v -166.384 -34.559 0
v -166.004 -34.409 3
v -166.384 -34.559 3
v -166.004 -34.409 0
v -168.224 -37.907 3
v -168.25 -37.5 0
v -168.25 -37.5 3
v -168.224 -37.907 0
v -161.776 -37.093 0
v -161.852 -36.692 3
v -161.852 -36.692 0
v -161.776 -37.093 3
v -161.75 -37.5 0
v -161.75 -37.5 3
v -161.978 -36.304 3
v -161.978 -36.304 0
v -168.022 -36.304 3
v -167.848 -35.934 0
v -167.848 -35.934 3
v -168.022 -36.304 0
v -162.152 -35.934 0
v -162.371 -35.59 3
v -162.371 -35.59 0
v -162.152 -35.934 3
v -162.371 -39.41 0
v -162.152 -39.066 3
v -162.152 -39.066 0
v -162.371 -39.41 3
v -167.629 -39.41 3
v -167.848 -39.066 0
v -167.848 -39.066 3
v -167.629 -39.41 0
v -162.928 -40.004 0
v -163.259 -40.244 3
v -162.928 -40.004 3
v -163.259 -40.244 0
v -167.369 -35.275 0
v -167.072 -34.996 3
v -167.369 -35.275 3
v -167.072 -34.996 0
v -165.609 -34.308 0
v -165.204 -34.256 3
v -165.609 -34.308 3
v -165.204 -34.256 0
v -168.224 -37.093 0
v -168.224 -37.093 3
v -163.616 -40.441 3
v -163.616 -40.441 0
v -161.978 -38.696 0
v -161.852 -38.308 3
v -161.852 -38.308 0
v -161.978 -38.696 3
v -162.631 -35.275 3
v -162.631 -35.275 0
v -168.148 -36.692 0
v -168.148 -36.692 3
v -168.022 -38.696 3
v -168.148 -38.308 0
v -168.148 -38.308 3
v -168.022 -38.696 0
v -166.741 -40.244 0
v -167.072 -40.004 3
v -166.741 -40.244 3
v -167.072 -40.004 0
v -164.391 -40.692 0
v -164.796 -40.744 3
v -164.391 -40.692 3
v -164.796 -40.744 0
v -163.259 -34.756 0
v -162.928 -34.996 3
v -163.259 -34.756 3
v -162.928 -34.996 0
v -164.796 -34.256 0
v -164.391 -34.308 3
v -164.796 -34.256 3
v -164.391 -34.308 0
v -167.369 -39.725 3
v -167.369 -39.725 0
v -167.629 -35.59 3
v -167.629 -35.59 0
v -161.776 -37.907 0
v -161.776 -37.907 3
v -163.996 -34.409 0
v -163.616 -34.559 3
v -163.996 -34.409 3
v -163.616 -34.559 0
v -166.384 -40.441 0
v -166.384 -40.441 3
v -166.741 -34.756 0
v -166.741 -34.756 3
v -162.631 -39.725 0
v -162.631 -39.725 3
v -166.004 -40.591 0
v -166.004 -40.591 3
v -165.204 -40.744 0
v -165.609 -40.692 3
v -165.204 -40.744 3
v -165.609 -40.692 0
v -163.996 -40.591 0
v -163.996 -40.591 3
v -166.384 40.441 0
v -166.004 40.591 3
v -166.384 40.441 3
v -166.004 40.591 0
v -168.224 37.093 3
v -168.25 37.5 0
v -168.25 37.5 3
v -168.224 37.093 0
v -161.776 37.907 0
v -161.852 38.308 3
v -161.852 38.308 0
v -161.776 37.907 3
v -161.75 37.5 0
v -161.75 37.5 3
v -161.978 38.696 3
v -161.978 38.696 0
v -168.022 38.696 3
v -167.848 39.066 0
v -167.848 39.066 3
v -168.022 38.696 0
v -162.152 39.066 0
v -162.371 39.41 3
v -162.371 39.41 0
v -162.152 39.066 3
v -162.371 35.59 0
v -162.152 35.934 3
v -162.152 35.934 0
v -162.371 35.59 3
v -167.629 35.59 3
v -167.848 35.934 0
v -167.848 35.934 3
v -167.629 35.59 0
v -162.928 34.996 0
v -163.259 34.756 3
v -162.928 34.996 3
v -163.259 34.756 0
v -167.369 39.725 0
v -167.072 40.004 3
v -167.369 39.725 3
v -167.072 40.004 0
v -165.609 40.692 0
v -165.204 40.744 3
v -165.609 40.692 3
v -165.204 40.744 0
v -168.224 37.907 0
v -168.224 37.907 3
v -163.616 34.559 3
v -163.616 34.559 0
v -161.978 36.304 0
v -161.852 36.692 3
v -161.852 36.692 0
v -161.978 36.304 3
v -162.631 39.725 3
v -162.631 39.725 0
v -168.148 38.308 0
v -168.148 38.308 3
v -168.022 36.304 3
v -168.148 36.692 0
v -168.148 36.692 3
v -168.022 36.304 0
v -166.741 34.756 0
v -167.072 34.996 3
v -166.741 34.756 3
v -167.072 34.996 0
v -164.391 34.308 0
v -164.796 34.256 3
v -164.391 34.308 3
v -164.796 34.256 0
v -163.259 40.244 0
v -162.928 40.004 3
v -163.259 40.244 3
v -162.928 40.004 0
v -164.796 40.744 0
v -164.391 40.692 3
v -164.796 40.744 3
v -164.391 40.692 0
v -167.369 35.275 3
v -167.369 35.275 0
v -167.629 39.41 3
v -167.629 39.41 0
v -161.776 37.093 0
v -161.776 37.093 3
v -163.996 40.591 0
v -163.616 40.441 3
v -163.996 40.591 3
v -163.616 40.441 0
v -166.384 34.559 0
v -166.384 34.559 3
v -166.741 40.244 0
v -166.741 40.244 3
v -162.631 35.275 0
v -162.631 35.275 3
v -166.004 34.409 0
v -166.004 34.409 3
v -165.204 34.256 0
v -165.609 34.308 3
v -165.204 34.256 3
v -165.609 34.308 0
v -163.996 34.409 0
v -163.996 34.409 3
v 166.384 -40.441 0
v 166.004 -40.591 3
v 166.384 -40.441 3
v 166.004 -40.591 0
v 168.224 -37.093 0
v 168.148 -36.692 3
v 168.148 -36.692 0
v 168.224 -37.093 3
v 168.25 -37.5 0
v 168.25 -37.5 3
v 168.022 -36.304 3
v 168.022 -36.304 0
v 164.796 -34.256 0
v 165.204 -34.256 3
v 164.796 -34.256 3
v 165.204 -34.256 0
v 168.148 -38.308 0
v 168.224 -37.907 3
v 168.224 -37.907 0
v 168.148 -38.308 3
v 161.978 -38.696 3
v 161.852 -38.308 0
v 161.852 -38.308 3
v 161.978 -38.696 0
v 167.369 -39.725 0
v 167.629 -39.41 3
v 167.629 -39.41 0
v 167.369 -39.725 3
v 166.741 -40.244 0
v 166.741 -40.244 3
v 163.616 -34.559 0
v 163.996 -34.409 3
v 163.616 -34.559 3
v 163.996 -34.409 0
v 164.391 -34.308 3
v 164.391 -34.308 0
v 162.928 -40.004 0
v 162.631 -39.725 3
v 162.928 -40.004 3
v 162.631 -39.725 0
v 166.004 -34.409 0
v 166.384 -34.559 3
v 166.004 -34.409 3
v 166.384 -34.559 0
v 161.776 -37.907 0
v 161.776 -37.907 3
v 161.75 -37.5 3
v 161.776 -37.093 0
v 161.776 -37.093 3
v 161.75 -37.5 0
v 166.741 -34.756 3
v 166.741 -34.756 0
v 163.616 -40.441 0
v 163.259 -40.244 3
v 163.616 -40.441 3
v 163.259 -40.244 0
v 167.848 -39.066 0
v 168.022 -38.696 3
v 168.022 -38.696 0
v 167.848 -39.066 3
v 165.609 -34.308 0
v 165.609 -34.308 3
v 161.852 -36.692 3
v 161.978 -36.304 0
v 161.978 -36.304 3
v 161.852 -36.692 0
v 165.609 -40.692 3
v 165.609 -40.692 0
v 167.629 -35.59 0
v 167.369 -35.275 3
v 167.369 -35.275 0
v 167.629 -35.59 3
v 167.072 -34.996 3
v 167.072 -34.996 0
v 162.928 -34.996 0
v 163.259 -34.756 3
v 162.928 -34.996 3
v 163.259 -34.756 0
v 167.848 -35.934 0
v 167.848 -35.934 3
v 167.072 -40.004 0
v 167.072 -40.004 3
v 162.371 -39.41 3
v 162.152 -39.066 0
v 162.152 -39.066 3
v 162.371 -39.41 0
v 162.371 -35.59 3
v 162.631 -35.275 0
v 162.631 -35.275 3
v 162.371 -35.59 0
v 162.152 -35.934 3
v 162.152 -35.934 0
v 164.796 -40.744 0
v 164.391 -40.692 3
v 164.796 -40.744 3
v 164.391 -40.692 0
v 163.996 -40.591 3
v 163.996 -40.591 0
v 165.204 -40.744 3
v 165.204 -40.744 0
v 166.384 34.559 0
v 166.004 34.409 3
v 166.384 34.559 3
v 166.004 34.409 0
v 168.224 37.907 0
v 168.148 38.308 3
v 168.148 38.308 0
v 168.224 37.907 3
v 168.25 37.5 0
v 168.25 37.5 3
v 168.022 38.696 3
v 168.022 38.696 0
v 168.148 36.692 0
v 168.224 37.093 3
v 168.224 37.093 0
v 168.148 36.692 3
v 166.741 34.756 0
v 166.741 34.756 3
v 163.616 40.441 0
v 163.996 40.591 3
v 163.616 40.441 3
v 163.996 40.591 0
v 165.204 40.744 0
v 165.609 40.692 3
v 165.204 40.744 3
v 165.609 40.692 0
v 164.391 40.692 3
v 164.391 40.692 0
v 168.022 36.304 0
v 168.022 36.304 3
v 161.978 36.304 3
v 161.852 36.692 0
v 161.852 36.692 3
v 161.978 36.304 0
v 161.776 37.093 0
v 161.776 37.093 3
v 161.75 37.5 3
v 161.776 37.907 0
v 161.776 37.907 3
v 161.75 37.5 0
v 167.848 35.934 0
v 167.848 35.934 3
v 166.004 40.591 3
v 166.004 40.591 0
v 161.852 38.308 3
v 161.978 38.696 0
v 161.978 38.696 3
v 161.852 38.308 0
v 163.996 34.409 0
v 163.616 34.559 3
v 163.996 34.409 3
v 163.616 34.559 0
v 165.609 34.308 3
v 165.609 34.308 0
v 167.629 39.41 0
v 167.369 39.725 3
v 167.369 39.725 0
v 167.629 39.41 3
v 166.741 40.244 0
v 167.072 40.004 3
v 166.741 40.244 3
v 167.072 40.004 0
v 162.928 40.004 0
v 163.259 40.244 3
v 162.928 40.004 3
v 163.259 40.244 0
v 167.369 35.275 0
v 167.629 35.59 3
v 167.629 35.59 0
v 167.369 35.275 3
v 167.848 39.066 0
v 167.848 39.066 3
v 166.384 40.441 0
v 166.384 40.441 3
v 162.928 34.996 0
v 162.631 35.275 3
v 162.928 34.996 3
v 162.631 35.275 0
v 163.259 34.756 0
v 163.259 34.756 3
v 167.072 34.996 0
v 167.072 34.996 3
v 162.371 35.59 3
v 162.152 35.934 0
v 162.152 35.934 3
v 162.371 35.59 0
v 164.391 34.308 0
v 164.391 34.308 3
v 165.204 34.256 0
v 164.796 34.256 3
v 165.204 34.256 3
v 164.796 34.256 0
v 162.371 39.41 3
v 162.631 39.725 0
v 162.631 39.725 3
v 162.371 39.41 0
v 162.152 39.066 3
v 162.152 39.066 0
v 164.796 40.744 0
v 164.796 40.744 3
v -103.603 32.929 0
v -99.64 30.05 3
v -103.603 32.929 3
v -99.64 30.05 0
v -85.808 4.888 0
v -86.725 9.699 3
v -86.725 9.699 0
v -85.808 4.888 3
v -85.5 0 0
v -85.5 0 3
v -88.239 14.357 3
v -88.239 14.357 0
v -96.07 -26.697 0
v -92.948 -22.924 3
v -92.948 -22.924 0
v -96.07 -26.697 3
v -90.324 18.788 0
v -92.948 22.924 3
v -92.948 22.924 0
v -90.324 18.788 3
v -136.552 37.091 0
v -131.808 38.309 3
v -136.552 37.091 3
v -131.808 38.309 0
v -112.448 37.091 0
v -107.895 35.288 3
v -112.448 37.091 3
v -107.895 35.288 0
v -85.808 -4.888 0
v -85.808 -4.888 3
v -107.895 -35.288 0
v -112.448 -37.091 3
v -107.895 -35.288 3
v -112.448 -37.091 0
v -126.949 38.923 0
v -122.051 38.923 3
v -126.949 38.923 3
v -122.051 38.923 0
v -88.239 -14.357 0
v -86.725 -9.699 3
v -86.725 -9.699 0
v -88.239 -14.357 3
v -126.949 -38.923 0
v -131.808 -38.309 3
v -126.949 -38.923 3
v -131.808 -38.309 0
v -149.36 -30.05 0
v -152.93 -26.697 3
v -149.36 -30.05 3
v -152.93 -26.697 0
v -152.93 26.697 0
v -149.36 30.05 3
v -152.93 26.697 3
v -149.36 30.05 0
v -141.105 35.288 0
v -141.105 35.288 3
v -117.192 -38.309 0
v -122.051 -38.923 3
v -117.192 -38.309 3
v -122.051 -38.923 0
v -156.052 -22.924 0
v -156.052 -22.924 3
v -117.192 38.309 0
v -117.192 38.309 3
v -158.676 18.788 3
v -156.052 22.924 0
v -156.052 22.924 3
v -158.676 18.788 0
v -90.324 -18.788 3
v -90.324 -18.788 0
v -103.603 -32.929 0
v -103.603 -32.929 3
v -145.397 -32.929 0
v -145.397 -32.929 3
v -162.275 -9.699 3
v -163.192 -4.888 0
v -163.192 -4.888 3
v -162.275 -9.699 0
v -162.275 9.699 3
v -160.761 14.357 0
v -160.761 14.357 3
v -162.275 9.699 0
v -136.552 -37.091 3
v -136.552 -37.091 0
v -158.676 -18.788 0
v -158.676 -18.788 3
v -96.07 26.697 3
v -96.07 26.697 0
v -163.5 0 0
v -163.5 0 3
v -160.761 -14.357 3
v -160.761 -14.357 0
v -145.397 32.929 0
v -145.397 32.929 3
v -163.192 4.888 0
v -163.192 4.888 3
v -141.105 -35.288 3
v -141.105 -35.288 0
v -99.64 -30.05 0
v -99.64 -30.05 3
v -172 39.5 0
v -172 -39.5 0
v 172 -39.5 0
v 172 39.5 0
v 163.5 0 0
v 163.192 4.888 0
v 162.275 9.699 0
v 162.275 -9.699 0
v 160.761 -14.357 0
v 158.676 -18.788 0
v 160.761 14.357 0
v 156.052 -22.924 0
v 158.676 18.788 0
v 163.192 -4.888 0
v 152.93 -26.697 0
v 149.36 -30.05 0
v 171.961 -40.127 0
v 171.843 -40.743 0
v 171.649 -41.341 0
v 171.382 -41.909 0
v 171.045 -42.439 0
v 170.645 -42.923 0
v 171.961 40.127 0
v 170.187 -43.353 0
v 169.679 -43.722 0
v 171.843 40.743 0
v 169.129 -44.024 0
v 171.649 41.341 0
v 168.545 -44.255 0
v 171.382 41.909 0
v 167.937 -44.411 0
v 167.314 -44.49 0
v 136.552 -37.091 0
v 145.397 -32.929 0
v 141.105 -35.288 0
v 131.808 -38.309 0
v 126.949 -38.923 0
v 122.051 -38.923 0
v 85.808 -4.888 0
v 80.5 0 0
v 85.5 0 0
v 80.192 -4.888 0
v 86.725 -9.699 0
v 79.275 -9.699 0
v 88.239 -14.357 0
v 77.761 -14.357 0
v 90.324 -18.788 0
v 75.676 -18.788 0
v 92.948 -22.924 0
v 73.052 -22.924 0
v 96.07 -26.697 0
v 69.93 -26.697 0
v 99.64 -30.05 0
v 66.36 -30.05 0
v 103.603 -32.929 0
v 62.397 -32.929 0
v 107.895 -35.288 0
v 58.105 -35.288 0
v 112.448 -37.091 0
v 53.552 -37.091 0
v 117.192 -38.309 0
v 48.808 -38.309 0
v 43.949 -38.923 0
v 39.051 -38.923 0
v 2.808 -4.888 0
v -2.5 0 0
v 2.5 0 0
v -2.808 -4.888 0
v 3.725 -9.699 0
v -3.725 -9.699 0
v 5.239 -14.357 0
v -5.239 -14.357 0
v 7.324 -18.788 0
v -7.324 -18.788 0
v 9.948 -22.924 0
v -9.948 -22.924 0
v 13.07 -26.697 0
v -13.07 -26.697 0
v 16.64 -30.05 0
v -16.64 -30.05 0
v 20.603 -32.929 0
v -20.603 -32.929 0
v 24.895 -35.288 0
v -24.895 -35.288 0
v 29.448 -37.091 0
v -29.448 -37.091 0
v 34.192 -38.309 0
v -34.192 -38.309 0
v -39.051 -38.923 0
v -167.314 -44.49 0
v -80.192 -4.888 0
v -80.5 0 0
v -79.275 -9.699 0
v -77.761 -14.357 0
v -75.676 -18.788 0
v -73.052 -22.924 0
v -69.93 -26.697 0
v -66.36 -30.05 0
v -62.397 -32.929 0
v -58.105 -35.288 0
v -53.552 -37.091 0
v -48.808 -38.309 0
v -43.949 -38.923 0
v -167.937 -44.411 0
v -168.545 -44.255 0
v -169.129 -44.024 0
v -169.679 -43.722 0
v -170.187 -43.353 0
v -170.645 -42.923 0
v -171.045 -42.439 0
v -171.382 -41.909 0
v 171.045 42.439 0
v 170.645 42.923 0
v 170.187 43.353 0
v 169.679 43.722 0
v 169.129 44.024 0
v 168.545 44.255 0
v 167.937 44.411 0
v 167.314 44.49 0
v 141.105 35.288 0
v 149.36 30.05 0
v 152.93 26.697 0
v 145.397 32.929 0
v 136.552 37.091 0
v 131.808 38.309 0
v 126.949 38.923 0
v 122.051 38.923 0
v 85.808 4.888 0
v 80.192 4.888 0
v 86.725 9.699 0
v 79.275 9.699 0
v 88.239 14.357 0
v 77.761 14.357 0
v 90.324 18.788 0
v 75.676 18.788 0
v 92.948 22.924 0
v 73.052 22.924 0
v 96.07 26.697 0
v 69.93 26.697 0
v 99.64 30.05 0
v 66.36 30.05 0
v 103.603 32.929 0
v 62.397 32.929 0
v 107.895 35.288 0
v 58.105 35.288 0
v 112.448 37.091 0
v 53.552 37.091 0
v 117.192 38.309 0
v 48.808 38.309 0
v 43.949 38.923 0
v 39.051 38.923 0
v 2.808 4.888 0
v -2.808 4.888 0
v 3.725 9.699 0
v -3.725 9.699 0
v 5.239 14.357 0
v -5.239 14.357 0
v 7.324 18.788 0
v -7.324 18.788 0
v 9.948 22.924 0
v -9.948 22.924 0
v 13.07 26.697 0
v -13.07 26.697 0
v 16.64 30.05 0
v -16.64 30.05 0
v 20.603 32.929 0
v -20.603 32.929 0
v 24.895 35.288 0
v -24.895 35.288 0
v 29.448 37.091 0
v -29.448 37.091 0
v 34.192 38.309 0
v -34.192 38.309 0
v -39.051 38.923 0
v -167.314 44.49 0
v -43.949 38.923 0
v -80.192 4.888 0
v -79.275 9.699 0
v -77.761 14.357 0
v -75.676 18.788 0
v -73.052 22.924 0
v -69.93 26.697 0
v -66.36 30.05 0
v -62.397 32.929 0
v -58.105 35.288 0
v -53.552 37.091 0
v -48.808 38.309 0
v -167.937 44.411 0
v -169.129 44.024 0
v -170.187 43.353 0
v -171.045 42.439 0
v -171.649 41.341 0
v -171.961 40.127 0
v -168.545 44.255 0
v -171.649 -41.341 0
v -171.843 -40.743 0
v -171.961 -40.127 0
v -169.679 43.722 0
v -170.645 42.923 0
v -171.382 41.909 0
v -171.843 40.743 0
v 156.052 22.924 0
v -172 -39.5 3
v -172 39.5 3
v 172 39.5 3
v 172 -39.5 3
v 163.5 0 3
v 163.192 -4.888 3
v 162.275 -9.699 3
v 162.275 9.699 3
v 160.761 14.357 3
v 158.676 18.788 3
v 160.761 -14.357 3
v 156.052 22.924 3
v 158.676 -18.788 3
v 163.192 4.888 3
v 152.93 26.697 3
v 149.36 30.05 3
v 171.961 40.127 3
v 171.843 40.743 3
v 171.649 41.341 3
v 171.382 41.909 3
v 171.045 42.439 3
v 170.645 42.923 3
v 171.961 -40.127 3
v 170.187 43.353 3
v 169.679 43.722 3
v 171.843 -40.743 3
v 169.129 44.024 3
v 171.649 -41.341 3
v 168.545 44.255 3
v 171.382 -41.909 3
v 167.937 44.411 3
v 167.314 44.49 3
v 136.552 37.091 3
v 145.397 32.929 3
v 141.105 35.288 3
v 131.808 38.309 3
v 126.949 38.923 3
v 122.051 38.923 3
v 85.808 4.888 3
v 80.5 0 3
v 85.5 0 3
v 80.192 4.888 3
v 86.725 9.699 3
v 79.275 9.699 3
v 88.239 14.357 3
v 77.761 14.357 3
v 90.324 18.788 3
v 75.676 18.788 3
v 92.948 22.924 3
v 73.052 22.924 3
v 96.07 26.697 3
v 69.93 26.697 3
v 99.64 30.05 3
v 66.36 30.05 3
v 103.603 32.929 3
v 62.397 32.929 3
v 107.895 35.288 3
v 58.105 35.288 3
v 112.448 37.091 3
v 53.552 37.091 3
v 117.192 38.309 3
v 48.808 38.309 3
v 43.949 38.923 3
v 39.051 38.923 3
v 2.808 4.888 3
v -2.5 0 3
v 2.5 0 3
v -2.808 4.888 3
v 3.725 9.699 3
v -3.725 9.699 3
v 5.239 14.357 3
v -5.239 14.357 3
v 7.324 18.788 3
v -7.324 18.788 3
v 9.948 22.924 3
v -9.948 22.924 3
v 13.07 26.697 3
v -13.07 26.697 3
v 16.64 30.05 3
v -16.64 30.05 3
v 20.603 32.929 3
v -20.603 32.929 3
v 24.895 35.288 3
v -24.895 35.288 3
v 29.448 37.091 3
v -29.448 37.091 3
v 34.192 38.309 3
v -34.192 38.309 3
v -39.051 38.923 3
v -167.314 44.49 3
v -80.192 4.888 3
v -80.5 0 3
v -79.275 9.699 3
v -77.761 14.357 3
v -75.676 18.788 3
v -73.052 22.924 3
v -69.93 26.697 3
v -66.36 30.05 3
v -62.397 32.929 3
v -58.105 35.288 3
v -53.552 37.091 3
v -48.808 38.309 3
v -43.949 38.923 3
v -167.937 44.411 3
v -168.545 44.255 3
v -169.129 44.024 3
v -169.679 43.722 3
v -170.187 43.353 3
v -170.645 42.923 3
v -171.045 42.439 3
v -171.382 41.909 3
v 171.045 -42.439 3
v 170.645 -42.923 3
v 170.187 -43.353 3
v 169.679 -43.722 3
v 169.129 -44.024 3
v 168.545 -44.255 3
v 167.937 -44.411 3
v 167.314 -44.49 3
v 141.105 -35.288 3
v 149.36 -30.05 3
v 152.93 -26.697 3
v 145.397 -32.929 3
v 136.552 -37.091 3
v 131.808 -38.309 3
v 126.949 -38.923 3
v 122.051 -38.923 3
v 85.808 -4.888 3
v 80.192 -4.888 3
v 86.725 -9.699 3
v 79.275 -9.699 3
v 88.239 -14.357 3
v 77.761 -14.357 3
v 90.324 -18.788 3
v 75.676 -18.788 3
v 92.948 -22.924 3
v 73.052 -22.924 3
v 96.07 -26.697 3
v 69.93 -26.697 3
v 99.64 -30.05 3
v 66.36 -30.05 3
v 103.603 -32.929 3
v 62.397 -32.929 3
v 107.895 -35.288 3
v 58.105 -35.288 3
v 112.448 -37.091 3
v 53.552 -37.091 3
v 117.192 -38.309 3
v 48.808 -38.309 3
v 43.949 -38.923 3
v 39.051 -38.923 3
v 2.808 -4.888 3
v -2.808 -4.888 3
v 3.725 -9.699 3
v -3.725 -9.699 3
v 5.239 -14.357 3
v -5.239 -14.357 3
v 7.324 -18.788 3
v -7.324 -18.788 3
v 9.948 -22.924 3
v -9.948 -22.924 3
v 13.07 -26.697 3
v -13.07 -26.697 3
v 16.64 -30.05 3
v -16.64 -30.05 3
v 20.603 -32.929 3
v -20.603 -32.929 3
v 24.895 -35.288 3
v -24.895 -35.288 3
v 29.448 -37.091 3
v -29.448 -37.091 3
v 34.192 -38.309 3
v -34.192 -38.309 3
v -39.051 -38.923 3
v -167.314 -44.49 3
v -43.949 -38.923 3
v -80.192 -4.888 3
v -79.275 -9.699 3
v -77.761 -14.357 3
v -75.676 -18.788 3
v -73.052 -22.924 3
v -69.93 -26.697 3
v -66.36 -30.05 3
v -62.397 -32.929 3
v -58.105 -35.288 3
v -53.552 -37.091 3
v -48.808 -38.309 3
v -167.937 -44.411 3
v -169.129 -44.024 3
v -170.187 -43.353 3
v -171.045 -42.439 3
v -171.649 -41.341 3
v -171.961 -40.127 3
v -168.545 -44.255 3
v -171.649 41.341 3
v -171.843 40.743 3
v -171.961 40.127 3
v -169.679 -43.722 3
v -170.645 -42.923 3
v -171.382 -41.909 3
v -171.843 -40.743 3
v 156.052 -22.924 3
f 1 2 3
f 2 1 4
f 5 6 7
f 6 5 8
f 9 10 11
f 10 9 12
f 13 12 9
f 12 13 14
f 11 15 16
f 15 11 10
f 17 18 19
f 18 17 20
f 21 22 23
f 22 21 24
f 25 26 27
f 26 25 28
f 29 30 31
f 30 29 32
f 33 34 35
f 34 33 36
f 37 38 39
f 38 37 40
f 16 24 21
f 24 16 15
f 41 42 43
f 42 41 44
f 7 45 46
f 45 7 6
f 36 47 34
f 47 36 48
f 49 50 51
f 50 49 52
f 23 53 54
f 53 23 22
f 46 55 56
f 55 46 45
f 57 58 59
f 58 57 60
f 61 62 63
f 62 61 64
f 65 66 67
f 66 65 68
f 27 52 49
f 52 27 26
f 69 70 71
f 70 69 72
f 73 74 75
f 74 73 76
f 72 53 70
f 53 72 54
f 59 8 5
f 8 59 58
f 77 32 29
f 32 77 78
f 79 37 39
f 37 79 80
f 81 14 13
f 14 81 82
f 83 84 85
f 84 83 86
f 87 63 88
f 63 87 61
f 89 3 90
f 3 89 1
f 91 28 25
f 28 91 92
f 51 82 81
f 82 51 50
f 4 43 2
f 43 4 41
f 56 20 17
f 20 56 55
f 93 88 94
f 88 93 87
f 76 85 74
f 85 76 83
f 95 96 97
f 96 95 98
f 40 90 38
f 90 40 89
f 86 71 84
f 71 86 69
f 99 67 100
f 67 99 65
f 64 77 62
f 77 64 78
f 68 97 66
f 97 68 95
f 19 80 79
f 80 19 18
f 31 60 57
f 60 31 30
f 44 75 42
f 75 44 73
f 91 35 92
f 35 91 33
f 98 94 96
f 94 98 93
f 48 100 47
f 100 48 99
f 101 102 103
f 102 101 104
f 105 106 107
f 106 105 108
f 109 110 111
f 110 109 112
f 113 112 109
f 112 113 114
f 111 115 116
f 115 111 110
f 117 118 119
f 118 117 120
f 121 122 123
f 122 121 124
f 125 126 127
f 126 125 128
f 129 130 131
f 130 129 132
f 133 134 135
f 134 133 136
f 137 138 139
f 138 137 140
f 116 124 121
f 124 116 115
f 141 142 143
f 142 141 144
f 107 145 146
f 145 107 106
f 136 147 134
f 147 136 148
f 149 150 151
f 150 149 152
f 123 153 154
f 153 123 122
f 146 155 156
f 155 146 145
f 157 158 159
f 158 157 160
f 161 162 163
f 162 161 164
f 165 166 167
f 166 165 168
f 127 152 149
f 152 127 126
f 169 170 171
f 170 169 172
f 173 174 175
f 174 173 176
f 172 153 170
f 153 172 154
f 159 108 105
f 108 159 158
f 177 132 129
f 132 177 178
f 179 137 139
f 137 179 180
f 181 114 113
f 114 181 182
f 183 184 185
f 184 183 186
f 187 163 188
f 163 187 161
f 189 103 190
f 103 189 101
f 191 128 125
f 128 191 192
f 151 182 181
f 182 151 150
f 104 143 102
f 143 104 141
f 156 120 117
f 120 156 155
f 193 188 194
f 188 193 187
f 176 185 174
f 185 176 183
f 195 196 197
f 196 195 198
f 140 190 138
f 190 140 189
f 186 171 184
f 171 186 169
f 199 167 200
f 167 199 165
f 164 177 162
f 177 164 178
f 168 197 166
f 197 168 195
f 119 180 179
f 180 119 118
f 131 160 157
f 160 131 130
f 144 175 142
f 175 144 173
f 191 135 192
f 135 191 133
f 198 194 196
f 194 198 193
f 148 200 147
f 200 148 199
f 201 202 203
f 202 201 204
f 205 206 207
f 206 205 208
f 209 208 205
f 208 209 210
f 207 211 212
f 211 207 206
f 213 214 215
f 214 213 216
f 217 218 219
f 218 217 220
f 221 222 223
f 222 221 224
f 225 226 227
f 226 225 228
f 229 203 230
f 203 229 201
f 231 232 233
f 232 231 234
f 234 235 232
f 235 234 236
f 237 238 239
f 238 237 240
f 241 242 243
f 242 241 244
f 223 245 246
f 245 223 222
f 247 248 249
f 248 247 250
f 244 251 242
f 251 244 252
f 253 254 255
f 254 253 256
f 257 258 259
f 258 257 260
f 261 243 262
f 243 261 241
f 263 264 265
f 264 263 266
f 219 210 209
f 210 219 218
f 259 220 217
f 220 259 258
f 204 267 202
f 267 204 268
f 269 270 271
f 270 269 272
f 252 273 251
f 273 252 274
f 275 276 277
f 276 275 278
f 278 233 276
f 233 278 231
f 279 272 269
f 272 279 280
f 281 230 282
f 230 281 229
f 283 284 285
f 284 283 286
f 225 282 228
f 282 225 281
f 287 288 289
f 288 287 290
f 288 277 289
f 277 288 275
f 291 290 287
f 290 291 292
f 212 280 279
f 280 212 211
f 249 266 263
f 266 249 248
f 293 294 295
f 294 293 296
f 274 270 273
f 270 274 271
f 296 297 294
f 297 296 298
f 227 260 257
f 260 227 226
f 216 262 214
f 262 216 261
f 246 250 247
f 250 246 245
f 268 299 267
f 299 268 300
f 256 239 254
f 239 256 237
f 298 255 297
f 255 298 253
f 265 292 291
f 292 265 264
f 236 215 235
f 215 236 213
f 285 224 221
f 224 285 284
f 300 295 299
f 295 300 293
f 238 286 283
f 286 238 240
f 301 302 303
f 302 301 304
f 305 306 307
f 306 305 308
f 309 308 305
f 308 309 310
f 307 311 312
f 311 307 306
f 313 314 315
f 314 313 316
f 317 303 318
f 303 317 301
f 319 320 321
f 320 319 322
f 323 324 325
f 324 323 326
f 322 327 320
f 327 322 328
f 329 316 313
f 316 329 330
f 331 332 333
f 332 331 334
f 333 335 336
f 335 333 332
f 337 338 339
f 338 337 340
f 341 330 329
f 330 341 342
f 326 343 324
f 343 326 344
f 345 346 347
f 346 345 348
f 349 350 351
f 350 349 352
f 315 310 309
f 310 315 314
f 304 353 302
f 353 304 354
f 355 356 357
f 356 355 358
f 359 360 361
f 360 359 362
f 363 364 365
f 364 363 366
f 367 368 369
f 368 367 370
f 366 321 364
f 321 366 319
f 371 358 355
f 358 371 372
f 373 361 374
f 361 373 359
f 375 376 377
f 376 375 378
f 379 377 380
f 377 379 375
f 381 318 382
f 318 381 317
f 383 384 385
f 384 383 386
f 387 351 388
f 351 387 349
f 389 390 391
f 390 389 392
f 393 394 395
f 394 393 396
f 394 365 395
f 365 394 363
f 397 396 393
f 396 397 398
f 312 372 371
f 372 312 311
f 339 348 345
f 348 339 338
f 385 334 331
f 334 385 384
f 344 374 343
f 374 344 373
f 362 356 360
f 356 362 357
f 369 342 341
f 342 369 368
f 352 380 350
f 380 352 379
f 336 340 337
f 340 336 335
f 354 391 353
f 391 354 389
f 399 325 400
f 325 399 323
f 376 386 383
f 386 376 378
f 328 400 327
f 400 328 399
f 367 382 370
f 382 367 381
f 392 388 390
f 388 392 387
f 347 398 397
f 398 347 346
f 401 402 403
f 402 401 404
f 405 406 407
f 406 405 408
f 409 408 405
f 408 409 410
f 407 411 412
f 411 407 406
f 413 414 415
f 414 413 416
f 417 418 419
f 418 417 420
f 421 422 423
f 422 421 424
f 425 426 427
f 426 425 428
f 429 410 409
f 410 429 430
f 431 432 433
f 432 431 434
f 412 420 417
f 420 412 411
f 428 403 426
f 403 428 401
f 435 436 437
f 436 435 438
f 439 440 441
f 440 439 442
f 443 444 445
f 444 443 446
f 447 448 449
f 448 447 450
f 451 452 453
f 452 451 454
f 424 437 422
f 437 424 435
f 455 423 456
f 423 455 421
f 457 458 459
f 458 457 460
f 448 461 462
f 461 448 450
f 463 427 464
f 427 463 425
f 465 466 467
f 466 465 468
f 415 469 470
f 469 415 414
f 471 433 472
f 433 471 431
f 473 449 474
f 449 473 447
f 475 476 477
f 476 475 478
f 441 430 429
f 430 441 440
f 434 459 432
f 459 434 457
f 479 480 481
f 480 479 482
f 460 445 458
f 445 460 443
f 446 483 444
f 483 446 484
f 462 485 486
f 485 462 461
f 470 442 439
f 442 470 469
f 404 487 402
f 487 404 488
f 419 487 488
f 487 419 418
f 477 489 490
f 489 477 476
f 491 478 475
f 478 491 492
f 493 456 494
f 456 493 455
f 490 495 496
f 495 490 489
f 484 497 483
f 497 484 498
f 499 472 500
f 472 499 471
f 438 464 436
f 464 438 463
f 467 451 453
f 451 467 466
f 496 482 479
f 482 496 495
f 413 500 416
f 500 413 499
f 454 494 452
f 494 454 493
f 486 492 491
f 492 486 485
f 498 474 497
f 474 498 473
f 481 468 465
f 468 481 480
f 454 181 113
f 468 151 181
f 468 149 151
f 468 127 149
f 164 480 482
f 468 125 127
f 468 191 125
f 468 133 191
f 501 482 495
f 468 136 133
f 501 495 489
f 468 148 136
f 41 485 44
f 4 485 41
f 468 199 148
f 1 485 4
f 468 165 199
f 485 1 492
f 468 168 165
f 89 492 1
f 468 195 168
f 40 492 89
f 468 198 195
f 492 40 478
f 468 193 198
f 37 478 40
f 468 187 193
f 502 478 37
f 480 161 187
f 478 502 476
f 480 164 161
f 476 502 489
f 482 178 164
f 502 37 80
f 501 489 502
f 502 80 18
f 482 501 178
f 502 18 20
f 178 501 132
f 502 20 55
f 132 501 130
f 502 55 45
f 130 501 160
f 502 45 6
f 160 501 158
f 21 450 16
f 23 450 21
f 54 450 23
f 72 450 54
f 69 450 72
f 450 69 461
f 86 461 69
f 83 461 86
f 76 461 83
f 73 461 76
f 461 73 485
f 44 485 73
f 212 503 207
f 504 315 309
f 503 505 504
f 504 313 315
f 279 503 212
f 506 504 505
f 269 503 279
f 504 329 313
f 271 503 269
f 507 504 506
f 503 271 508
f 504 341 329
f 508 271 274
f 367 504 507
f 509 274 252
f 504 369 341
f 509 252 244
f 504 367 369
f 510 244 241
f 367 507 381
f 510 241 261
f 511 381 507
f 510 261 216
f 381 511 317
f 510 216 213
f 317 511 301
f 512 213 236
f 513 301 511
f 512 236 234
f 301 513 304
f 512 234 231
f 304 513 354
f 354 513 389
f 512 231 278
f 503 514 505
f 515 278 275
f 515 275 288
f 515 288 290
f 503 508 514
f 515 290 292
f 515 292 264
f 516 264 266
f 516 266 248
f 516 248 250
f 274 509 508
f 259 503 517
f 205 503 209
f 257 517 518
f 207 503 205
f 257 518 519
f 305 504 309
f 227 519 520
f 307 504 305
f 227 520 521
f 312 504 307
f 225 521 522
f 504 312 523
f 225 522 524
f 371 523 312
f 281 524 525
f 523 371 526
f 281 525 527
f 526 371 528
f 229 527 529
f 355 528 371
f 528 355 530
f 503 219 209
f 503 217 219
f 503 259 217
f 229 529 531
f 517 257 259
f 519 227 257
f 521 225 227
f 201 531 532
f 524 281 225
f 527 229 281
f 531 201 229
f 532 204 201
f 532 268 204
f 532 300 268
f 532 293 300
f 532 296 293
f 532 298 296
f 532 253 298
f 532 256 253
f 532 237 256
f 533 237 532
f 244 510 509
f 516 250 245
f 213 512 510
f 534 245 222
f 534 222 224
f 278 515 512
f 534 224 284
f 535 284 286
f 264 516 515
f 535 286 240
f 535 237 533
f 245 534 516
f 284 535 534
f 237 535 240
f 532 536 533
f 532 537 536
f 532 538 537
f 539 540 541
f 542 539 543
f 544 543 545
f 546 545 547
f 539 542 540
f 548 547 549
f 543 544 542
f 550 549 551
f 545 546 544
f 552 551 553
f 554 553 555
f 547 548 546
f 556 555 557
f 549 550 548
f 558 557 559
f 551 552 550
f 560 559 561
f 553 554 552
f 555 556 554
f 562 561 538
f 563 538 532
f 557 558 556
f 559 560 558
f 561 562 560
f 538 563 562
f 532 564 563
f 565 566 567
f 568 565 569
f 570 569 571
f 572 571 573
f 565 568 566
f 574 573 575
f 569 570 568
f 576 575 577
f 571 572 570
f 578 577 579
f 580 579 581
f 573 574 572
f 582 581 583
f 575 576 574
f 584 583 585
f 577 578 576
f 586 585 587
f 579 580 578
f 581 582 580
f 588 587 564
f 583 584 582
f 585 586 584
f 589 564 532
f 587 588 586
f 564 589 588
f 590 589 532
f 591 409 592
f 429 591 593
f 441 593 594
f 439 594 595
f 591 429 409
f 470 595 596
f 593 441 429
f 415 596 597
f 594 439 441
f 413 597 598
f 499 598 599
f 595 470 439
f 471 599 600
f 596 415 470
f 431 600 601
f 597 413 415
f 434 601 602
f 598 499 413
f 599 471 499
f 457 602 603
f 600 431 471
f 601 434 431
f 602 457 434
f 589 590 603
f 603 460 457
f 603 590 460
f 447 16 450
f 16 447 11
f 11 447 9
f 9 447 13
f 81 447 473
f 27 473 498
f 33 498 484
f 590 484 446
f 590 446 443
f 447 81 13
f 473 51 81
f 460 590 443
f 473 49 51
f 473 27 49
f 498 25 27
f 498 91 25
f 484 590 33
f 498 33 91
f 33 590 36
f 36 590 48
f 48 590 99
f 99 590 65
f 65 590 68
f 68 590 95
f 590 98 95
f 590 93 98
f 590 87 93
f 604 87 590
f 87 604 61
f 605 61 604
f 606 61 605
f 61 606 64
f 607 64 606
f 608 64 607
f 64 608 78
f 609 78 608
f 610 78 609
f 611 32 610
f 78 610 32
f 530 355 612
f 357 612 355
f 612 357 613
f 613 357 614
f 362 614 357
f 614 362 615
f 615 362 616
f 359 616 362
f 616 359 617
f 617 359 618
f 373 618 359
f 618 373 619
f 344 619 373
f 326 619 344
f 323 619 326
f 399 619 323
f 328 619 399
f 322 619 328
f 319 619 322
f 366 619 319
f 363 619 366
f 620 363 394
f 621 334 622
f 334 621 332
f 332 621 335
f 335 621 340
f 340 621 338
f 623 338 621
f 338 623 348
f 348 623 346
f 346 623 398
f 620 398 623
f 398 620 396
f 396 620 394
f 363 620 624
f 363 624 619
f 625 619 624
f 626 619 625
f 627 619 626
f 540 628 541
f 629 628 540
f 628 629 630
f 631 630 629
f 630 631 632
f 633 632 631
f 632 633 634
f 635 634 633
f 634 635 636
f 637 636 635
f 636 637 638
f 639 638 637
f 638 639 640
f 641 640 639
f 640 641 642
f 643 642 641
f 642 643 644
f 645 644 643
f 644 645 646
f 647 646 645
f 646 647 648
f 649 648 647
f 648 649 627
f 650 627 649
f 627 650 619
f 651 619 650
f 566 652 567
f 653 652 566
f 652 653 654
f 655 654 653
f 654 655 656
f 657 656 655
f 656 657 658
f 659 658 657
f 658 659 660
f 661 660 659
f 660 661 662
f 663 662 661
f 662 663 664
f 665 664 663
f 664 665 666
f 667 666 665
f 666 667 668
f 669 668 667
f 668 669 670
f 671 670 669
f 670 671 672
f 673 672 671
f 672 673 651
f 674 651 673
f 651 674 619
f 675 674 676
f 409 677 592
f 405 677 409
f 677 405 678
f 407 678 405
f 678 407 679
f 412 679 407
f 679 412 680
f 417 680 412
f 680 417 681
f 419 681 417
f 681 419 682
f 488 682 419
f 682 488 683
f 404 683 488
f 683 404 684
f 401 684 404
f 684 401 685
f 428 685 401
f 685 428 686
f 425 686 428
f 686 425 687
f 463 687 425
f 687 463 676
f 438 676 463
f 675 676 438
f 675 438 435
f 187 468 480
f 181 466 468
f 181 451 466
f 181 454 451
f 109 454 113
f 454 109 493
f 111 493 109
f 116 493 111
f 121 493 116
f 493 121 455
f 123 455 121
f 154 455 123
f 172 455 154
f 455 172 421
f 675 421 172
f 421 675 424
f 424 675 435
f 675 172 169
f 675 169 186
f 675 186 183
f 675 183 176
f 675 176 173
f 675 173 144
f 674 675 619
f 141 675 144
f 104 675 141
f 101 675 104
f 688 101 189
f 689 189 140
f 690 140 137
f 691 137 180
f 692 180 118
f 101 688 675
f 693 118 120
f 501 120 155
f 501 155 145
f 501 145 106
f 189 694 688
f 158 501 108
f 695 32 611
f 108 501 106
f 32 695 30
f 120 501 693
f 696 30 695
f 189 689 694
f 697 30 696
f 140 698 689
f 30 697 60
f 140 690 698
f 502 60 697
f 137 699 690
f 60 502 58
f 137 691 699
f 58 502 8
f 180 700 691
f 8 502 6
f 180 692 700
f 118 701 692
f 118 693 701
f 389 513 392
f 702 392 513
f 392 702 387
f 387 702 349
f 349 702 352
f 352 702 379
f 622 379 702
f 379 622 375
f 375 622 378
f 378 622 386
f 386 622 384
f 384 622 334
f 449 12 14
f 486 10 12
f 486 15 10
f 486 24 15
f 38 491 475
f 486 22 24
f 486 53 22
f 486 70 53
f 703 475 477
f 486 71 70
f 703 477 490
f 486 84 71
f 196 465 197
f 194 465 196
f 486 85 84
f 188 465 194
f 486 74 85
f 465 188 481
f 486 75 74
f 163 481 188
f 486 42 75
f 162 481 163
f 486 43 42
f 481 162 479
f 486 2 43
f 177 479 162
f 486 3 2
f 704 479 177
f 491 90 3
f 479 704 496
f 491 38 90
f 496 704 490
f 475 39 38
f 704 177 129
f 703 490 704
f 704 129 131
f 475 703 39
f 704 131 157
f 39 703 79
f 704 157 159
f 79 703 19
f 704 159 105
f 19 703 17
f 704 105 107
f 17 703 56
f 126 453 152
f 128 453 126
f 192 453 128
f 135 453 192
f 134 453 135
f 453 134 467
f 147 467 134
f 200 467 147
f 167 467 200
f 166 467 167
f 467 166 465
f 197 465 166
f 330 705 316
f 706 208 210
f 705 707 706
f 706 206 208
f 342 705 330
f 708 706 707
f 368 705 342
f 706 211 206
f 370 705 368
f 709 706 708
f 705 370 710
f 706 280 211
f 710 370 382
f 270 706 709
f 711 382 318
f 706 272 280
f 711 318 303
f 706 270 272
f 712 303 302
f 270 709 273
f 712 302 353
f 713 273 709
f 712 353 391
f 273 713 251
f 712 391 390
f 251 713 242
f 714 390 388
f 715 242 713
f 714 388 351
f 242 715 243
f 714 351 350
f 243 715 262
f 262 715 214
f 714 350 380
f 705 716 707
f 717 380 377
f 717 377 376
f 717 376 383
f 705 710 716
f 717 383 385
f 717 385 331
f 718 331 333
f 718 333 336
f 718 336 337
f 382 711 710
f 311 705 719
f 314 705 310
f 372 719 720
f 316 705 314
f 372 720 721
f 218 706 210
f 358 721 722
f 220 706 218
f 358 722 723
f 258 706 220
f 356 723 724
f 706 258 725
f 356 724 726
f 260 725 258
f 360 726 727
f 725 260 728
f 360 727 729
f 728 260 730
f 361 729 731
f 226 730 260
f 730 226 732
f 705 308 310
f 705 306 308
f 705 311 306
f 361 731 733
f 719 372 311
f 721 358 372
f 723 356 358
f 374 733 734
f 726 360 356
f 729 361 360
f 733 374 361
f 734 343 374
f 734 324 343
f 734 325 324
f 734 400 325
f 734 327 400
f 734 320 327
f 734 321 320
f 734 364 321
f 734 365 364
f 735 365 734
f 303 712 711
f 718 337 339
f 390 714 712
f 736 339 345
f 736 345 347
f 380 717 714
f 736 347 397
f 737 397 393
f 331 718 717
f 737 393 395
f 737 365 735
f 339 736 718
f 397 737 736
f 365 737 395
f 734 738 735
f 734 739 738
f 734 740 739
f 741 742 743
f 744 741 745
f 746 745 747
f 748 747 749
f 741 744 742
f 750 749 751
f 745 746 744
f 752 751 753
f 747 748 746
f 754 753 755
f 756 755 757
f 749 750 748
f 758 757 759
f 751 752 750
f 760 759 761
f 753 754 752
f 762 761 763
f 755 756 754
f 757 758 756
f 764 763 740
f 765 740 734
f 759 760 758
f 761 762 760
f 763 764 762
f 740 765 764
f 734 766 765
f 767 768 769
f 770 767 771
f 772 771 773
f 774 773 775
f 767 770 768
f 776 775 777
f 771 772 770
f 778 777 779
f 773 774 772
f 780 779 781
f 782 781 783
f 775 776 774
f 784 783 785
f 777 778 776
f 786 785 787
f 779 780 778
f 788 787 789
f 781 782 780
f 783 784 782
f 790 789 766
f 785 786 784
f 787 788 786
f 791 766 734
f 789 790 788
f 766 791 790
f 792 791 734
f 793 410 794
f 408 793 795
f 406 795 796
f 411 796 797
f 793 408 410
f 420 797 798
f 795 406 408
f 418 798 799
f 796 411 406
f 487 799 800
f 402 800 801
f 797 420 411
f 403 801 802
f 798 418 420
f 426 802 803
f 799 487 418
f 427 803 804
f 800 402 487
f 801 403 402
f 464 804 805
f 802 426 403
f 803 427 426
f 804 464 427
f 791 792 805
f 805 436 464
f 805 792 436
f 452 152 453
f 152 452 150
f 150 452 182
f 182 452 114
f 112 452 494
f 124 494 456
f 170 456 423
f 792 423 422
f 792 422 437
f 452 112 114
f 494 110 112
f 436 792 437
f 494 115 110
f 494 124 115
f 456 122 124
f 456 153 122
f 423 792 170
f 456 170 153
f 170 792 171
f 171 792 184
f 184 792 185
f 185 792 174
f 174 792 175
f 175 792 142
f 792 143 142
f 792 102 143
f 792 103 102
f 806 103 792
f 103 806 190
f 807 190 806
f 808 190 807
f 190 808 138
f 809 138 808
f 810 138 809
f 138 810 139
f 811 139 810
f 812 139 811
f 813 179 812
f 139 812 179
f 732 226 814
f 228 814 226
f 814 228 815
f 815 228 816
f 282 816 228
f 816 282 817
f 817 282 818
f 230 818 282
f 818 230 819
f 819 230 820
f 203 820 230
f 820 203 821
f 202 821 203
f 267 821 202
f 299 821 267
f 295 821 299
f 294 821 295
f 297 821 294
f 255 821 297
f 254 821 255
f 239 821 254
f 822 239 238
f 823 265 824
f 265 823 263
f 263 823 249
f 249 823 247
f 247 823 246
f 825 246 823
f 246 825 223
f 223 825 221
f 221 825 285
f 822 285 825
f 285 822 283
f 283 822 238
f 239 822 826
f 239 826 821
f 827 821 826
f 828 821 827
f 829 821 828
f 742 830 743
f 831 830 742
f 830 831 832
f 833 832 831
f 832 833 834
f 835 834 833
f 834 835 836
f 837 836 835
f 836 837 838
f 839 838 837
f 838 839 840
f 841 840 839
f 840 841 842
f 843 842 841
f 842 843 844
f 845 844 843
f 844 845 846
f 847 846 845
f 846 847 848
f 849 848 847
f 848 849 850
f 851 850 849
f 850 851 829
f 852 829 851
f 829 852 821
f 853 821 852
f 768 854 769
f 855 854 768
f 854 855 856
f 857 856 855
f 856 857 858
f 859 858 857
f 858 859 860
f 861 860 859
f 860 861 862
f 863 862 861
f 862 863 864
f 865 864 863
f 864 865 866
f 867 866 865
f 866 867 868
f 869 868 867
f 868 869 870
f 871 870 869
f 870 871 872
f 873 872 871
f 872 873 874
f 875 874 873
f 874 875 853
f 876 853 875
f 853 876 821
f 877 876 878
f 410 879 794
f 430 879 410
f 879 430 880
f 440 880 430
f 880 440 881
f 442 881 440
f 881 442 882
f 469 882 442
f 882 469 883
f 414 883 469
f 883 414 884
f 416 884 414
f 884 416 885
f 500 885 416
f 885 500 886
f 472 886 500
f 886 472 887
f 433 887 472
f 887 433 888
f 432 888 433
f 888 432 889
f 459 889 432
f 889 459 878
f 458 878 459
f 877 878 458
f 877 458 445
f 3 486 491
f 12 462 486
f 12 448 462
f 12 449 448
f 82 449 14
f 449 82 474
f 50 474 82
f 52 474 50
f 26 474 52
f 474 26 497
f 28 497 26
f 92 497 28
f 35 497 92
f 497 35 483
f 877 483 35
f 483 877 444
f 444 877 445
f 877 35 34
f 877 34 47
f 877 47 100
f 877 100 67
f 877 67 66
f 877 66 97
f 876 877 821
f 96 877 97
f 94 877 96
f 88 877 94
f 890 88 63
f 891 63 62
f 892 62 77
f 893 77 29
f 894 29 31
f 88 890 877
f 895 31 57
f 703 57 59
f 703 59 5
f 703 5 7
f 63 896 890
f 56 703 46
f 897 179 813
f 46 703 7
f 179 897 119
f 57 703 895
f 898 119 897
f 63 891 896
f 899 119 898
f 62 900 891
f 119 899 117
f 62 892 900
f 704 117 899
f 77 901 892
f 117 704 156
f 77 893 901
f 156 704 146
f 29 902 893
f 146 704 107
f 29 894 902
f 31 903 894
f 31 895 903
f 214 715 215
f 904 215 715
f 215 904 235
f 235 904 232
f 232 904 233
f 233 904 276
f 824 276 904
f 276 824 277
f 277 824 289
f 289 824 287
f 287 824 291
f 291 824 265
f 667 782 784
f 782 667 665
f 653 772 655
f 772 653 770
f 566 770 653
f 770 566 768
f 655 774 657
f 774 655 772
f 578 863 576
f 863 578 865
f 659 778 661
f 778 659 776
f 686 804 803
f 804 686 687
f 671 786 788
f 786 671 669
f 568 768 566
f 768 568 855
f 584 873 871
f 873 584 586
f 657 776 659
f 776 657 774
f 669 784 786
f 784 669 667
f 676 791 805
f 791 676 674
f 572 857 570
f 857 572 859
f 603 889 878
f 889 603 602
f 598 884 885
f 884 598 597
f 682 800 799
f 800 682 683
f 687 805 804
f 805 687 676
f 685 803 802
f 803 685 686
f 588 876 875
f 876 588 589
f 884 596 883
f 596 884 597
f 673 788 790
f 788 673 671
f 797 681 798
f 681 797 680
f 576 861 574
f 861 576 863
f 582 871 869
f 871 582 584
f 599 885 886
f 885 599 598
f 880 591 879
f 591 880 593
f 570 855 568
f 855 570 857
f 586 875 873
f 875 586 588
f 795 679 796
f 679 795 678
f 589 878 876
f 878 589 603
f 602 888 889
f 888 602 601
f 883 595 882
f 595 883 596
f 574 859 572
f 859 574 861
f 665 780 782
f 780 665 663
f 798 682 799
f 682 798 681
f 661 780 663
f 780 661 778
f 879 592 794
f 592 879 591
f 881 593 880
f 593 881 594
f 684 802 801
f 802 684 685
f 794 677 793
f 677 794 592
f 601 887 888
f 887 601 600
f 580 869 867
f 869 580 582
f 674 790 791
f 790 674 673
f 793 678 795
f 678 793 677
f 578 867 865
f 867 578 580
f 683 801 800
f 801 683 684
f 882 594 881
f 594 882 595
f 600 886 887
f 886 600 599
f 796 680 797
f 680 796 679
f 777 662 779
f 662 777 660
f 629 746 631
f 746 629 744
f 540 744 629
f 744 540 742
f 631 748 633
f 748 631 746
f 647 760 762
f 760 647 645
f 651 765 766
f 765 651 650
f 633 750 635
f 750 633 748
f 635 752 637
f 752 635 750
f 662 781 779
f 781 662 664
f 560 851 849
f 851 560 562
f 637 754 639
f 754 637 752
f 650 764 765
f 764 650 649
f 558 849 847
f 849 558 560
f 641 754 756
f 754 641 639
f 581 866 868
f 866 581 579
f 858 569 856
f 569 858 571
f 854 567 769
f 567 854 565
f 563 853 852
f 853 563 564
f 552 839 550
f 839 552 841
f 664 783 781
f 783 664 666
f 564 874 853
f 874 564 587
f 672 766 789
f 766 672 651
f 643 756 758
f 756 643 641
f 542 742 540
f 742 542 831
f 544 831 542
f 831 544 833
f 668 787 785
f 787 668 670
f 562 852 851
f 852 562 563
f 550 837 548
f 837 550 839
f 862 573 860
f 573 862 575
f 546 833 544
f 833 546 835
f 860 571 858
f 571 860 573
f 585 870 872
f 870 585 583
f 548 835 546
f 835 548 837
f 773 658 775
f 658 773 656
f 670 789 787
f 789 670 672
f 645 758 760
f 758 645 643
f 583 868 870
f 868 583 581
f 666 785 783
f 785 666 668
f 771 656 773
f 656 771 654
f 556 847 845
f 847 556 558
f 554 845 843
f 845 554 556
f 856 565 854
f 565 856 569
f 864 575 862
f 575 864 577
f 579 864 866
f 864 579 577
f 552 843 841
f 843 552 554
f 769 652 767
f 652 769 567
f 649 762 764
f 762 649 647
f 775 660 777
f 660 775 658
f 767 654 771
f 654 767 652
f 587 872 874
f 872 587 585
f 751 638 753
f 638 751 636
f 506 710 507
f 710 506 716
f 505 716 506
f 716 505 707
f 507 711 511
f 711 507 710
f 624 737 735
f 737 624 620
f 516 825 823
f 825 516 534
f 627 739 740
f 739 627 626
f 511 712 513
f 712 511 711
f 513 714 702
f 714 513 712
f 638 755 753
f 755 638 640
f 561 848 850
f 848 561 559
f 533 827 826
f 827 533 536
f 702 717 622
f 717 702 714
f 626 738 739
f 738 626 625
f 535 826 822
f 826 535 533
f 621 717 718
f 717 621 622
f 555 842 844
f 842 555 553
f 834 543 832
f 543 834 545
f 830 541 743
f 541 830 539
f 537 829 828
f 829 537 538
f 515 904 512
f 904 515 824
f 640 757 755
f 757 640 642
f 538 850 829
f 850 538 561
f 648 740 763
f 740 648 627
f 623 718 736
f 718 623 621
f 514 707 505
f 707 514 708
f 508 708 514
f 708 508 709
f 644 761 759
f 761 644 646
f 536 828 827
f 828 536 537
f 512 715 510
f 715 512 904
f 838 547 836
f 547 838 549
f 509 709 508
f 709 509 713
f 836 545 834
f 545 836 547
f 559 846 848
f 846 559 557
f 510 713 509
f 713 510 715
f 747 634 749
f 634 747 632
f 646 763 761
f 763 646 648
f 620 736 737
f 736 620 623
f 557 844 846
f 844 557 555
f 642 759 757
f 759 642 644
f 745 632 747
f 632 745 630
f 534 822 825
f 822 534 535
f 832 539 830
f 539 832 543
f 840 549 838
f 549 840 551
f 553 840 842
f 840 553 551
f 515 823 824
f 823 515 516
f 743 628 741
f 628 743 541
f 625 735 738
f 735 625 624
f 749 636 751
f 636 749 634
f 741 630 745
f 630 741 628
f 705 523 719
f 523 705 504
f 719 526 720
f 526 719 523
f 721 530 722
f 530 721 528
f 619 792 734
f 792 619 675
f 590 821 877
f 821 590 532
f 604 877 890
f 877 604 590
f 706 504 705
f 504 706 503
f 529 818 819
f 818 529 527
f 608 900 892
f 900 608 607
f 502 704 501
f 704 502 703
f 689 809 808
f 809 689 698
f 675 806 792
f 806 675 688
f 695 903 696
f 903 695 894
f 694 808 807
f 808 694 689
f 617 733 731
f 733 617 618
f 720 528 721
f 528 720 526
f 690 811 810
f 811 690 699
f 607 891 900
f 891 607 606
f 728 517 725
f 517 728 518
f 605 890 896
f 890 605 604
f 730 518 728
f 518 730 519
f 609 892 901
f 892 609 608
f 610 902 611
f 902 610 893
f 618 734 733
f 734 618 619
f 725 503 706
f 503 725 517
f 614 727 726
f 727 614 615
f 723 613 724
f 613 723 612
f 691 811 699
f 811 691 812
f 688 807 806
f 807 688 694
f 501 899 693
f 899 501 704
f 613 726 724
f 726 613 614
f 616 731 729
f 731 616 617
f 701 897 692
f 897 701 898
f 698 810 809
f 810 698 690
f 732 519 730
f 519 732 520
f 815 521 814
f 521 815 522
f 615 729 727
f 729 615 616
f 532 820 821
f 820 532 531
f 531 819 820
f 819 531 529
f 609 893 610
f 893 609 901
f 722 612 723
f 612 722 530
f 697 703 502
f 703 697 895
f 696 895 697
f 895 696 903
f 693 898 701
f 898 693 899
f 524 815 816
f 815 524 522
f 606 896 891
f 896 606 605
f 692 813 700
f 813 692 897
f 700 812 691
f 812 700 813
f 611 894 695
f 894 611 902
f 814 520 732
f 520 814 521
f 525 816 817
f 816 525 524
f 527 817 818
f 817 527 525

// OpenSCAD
$fn = 50;


difference() {
	union() {
		hull() {
			translate(v = [-167.0000000000, 39.5000000000, 0]) {
				cylinder(h = 3, r = 5);
			}
			translate(v = [167.0000000000, 39.5000000000, 0]) {
				cylinder(h = 3, r = 5);
			}
			translate(v = [-167.0000000000, -39.5000000000, 0]) {
				cylinder(h = 3, r = 5);
			}
			translate(v = [167.0000000000, -39.5000000000, 0]) {
				cylinder(h = 3, r = 5);
			}
		}
	}
	union() {
		#translate(v = [-165.0000000000, -37.5000000000, -100.0000000000]) {
			cylinder(h = 200, r = 3.2500000000);
		}
		#translate(v = [-165.0000000000, 37.5000000000, -100.0000000000]) {
			cylinder(h = 200, r = 3.2500000000);
		}
		#translate(v = [165.0000000000, -37.5000000000, -100.0000000000]) {
			cylinder(h = 200, r = 3.2500000000);
		}
		#translate(v = [165.0000000000, 37.5000000000, -100.0000000000]) {
			cylinder(h = 200, r = 3.2500000000);
		}
		#translate(v = [-124.5000000000, 0, 0]) {
			cylinder(h = 3, r = 39.0000000000);
		}
		#translate(v = [-41.5000000000, 0, 0]) {
			cylinder(h = 3, r = 39.0000000000);
		}
		#translate(v = [41.5000000000, 0, 0]) {
			cylinder(h = 3, r = 39.0000000000);
		}
		#translate(v = [124.5000000000, 0, 0]) {
			cylinder(h = 3, r = 39.0000000000);
		}
	}
}
